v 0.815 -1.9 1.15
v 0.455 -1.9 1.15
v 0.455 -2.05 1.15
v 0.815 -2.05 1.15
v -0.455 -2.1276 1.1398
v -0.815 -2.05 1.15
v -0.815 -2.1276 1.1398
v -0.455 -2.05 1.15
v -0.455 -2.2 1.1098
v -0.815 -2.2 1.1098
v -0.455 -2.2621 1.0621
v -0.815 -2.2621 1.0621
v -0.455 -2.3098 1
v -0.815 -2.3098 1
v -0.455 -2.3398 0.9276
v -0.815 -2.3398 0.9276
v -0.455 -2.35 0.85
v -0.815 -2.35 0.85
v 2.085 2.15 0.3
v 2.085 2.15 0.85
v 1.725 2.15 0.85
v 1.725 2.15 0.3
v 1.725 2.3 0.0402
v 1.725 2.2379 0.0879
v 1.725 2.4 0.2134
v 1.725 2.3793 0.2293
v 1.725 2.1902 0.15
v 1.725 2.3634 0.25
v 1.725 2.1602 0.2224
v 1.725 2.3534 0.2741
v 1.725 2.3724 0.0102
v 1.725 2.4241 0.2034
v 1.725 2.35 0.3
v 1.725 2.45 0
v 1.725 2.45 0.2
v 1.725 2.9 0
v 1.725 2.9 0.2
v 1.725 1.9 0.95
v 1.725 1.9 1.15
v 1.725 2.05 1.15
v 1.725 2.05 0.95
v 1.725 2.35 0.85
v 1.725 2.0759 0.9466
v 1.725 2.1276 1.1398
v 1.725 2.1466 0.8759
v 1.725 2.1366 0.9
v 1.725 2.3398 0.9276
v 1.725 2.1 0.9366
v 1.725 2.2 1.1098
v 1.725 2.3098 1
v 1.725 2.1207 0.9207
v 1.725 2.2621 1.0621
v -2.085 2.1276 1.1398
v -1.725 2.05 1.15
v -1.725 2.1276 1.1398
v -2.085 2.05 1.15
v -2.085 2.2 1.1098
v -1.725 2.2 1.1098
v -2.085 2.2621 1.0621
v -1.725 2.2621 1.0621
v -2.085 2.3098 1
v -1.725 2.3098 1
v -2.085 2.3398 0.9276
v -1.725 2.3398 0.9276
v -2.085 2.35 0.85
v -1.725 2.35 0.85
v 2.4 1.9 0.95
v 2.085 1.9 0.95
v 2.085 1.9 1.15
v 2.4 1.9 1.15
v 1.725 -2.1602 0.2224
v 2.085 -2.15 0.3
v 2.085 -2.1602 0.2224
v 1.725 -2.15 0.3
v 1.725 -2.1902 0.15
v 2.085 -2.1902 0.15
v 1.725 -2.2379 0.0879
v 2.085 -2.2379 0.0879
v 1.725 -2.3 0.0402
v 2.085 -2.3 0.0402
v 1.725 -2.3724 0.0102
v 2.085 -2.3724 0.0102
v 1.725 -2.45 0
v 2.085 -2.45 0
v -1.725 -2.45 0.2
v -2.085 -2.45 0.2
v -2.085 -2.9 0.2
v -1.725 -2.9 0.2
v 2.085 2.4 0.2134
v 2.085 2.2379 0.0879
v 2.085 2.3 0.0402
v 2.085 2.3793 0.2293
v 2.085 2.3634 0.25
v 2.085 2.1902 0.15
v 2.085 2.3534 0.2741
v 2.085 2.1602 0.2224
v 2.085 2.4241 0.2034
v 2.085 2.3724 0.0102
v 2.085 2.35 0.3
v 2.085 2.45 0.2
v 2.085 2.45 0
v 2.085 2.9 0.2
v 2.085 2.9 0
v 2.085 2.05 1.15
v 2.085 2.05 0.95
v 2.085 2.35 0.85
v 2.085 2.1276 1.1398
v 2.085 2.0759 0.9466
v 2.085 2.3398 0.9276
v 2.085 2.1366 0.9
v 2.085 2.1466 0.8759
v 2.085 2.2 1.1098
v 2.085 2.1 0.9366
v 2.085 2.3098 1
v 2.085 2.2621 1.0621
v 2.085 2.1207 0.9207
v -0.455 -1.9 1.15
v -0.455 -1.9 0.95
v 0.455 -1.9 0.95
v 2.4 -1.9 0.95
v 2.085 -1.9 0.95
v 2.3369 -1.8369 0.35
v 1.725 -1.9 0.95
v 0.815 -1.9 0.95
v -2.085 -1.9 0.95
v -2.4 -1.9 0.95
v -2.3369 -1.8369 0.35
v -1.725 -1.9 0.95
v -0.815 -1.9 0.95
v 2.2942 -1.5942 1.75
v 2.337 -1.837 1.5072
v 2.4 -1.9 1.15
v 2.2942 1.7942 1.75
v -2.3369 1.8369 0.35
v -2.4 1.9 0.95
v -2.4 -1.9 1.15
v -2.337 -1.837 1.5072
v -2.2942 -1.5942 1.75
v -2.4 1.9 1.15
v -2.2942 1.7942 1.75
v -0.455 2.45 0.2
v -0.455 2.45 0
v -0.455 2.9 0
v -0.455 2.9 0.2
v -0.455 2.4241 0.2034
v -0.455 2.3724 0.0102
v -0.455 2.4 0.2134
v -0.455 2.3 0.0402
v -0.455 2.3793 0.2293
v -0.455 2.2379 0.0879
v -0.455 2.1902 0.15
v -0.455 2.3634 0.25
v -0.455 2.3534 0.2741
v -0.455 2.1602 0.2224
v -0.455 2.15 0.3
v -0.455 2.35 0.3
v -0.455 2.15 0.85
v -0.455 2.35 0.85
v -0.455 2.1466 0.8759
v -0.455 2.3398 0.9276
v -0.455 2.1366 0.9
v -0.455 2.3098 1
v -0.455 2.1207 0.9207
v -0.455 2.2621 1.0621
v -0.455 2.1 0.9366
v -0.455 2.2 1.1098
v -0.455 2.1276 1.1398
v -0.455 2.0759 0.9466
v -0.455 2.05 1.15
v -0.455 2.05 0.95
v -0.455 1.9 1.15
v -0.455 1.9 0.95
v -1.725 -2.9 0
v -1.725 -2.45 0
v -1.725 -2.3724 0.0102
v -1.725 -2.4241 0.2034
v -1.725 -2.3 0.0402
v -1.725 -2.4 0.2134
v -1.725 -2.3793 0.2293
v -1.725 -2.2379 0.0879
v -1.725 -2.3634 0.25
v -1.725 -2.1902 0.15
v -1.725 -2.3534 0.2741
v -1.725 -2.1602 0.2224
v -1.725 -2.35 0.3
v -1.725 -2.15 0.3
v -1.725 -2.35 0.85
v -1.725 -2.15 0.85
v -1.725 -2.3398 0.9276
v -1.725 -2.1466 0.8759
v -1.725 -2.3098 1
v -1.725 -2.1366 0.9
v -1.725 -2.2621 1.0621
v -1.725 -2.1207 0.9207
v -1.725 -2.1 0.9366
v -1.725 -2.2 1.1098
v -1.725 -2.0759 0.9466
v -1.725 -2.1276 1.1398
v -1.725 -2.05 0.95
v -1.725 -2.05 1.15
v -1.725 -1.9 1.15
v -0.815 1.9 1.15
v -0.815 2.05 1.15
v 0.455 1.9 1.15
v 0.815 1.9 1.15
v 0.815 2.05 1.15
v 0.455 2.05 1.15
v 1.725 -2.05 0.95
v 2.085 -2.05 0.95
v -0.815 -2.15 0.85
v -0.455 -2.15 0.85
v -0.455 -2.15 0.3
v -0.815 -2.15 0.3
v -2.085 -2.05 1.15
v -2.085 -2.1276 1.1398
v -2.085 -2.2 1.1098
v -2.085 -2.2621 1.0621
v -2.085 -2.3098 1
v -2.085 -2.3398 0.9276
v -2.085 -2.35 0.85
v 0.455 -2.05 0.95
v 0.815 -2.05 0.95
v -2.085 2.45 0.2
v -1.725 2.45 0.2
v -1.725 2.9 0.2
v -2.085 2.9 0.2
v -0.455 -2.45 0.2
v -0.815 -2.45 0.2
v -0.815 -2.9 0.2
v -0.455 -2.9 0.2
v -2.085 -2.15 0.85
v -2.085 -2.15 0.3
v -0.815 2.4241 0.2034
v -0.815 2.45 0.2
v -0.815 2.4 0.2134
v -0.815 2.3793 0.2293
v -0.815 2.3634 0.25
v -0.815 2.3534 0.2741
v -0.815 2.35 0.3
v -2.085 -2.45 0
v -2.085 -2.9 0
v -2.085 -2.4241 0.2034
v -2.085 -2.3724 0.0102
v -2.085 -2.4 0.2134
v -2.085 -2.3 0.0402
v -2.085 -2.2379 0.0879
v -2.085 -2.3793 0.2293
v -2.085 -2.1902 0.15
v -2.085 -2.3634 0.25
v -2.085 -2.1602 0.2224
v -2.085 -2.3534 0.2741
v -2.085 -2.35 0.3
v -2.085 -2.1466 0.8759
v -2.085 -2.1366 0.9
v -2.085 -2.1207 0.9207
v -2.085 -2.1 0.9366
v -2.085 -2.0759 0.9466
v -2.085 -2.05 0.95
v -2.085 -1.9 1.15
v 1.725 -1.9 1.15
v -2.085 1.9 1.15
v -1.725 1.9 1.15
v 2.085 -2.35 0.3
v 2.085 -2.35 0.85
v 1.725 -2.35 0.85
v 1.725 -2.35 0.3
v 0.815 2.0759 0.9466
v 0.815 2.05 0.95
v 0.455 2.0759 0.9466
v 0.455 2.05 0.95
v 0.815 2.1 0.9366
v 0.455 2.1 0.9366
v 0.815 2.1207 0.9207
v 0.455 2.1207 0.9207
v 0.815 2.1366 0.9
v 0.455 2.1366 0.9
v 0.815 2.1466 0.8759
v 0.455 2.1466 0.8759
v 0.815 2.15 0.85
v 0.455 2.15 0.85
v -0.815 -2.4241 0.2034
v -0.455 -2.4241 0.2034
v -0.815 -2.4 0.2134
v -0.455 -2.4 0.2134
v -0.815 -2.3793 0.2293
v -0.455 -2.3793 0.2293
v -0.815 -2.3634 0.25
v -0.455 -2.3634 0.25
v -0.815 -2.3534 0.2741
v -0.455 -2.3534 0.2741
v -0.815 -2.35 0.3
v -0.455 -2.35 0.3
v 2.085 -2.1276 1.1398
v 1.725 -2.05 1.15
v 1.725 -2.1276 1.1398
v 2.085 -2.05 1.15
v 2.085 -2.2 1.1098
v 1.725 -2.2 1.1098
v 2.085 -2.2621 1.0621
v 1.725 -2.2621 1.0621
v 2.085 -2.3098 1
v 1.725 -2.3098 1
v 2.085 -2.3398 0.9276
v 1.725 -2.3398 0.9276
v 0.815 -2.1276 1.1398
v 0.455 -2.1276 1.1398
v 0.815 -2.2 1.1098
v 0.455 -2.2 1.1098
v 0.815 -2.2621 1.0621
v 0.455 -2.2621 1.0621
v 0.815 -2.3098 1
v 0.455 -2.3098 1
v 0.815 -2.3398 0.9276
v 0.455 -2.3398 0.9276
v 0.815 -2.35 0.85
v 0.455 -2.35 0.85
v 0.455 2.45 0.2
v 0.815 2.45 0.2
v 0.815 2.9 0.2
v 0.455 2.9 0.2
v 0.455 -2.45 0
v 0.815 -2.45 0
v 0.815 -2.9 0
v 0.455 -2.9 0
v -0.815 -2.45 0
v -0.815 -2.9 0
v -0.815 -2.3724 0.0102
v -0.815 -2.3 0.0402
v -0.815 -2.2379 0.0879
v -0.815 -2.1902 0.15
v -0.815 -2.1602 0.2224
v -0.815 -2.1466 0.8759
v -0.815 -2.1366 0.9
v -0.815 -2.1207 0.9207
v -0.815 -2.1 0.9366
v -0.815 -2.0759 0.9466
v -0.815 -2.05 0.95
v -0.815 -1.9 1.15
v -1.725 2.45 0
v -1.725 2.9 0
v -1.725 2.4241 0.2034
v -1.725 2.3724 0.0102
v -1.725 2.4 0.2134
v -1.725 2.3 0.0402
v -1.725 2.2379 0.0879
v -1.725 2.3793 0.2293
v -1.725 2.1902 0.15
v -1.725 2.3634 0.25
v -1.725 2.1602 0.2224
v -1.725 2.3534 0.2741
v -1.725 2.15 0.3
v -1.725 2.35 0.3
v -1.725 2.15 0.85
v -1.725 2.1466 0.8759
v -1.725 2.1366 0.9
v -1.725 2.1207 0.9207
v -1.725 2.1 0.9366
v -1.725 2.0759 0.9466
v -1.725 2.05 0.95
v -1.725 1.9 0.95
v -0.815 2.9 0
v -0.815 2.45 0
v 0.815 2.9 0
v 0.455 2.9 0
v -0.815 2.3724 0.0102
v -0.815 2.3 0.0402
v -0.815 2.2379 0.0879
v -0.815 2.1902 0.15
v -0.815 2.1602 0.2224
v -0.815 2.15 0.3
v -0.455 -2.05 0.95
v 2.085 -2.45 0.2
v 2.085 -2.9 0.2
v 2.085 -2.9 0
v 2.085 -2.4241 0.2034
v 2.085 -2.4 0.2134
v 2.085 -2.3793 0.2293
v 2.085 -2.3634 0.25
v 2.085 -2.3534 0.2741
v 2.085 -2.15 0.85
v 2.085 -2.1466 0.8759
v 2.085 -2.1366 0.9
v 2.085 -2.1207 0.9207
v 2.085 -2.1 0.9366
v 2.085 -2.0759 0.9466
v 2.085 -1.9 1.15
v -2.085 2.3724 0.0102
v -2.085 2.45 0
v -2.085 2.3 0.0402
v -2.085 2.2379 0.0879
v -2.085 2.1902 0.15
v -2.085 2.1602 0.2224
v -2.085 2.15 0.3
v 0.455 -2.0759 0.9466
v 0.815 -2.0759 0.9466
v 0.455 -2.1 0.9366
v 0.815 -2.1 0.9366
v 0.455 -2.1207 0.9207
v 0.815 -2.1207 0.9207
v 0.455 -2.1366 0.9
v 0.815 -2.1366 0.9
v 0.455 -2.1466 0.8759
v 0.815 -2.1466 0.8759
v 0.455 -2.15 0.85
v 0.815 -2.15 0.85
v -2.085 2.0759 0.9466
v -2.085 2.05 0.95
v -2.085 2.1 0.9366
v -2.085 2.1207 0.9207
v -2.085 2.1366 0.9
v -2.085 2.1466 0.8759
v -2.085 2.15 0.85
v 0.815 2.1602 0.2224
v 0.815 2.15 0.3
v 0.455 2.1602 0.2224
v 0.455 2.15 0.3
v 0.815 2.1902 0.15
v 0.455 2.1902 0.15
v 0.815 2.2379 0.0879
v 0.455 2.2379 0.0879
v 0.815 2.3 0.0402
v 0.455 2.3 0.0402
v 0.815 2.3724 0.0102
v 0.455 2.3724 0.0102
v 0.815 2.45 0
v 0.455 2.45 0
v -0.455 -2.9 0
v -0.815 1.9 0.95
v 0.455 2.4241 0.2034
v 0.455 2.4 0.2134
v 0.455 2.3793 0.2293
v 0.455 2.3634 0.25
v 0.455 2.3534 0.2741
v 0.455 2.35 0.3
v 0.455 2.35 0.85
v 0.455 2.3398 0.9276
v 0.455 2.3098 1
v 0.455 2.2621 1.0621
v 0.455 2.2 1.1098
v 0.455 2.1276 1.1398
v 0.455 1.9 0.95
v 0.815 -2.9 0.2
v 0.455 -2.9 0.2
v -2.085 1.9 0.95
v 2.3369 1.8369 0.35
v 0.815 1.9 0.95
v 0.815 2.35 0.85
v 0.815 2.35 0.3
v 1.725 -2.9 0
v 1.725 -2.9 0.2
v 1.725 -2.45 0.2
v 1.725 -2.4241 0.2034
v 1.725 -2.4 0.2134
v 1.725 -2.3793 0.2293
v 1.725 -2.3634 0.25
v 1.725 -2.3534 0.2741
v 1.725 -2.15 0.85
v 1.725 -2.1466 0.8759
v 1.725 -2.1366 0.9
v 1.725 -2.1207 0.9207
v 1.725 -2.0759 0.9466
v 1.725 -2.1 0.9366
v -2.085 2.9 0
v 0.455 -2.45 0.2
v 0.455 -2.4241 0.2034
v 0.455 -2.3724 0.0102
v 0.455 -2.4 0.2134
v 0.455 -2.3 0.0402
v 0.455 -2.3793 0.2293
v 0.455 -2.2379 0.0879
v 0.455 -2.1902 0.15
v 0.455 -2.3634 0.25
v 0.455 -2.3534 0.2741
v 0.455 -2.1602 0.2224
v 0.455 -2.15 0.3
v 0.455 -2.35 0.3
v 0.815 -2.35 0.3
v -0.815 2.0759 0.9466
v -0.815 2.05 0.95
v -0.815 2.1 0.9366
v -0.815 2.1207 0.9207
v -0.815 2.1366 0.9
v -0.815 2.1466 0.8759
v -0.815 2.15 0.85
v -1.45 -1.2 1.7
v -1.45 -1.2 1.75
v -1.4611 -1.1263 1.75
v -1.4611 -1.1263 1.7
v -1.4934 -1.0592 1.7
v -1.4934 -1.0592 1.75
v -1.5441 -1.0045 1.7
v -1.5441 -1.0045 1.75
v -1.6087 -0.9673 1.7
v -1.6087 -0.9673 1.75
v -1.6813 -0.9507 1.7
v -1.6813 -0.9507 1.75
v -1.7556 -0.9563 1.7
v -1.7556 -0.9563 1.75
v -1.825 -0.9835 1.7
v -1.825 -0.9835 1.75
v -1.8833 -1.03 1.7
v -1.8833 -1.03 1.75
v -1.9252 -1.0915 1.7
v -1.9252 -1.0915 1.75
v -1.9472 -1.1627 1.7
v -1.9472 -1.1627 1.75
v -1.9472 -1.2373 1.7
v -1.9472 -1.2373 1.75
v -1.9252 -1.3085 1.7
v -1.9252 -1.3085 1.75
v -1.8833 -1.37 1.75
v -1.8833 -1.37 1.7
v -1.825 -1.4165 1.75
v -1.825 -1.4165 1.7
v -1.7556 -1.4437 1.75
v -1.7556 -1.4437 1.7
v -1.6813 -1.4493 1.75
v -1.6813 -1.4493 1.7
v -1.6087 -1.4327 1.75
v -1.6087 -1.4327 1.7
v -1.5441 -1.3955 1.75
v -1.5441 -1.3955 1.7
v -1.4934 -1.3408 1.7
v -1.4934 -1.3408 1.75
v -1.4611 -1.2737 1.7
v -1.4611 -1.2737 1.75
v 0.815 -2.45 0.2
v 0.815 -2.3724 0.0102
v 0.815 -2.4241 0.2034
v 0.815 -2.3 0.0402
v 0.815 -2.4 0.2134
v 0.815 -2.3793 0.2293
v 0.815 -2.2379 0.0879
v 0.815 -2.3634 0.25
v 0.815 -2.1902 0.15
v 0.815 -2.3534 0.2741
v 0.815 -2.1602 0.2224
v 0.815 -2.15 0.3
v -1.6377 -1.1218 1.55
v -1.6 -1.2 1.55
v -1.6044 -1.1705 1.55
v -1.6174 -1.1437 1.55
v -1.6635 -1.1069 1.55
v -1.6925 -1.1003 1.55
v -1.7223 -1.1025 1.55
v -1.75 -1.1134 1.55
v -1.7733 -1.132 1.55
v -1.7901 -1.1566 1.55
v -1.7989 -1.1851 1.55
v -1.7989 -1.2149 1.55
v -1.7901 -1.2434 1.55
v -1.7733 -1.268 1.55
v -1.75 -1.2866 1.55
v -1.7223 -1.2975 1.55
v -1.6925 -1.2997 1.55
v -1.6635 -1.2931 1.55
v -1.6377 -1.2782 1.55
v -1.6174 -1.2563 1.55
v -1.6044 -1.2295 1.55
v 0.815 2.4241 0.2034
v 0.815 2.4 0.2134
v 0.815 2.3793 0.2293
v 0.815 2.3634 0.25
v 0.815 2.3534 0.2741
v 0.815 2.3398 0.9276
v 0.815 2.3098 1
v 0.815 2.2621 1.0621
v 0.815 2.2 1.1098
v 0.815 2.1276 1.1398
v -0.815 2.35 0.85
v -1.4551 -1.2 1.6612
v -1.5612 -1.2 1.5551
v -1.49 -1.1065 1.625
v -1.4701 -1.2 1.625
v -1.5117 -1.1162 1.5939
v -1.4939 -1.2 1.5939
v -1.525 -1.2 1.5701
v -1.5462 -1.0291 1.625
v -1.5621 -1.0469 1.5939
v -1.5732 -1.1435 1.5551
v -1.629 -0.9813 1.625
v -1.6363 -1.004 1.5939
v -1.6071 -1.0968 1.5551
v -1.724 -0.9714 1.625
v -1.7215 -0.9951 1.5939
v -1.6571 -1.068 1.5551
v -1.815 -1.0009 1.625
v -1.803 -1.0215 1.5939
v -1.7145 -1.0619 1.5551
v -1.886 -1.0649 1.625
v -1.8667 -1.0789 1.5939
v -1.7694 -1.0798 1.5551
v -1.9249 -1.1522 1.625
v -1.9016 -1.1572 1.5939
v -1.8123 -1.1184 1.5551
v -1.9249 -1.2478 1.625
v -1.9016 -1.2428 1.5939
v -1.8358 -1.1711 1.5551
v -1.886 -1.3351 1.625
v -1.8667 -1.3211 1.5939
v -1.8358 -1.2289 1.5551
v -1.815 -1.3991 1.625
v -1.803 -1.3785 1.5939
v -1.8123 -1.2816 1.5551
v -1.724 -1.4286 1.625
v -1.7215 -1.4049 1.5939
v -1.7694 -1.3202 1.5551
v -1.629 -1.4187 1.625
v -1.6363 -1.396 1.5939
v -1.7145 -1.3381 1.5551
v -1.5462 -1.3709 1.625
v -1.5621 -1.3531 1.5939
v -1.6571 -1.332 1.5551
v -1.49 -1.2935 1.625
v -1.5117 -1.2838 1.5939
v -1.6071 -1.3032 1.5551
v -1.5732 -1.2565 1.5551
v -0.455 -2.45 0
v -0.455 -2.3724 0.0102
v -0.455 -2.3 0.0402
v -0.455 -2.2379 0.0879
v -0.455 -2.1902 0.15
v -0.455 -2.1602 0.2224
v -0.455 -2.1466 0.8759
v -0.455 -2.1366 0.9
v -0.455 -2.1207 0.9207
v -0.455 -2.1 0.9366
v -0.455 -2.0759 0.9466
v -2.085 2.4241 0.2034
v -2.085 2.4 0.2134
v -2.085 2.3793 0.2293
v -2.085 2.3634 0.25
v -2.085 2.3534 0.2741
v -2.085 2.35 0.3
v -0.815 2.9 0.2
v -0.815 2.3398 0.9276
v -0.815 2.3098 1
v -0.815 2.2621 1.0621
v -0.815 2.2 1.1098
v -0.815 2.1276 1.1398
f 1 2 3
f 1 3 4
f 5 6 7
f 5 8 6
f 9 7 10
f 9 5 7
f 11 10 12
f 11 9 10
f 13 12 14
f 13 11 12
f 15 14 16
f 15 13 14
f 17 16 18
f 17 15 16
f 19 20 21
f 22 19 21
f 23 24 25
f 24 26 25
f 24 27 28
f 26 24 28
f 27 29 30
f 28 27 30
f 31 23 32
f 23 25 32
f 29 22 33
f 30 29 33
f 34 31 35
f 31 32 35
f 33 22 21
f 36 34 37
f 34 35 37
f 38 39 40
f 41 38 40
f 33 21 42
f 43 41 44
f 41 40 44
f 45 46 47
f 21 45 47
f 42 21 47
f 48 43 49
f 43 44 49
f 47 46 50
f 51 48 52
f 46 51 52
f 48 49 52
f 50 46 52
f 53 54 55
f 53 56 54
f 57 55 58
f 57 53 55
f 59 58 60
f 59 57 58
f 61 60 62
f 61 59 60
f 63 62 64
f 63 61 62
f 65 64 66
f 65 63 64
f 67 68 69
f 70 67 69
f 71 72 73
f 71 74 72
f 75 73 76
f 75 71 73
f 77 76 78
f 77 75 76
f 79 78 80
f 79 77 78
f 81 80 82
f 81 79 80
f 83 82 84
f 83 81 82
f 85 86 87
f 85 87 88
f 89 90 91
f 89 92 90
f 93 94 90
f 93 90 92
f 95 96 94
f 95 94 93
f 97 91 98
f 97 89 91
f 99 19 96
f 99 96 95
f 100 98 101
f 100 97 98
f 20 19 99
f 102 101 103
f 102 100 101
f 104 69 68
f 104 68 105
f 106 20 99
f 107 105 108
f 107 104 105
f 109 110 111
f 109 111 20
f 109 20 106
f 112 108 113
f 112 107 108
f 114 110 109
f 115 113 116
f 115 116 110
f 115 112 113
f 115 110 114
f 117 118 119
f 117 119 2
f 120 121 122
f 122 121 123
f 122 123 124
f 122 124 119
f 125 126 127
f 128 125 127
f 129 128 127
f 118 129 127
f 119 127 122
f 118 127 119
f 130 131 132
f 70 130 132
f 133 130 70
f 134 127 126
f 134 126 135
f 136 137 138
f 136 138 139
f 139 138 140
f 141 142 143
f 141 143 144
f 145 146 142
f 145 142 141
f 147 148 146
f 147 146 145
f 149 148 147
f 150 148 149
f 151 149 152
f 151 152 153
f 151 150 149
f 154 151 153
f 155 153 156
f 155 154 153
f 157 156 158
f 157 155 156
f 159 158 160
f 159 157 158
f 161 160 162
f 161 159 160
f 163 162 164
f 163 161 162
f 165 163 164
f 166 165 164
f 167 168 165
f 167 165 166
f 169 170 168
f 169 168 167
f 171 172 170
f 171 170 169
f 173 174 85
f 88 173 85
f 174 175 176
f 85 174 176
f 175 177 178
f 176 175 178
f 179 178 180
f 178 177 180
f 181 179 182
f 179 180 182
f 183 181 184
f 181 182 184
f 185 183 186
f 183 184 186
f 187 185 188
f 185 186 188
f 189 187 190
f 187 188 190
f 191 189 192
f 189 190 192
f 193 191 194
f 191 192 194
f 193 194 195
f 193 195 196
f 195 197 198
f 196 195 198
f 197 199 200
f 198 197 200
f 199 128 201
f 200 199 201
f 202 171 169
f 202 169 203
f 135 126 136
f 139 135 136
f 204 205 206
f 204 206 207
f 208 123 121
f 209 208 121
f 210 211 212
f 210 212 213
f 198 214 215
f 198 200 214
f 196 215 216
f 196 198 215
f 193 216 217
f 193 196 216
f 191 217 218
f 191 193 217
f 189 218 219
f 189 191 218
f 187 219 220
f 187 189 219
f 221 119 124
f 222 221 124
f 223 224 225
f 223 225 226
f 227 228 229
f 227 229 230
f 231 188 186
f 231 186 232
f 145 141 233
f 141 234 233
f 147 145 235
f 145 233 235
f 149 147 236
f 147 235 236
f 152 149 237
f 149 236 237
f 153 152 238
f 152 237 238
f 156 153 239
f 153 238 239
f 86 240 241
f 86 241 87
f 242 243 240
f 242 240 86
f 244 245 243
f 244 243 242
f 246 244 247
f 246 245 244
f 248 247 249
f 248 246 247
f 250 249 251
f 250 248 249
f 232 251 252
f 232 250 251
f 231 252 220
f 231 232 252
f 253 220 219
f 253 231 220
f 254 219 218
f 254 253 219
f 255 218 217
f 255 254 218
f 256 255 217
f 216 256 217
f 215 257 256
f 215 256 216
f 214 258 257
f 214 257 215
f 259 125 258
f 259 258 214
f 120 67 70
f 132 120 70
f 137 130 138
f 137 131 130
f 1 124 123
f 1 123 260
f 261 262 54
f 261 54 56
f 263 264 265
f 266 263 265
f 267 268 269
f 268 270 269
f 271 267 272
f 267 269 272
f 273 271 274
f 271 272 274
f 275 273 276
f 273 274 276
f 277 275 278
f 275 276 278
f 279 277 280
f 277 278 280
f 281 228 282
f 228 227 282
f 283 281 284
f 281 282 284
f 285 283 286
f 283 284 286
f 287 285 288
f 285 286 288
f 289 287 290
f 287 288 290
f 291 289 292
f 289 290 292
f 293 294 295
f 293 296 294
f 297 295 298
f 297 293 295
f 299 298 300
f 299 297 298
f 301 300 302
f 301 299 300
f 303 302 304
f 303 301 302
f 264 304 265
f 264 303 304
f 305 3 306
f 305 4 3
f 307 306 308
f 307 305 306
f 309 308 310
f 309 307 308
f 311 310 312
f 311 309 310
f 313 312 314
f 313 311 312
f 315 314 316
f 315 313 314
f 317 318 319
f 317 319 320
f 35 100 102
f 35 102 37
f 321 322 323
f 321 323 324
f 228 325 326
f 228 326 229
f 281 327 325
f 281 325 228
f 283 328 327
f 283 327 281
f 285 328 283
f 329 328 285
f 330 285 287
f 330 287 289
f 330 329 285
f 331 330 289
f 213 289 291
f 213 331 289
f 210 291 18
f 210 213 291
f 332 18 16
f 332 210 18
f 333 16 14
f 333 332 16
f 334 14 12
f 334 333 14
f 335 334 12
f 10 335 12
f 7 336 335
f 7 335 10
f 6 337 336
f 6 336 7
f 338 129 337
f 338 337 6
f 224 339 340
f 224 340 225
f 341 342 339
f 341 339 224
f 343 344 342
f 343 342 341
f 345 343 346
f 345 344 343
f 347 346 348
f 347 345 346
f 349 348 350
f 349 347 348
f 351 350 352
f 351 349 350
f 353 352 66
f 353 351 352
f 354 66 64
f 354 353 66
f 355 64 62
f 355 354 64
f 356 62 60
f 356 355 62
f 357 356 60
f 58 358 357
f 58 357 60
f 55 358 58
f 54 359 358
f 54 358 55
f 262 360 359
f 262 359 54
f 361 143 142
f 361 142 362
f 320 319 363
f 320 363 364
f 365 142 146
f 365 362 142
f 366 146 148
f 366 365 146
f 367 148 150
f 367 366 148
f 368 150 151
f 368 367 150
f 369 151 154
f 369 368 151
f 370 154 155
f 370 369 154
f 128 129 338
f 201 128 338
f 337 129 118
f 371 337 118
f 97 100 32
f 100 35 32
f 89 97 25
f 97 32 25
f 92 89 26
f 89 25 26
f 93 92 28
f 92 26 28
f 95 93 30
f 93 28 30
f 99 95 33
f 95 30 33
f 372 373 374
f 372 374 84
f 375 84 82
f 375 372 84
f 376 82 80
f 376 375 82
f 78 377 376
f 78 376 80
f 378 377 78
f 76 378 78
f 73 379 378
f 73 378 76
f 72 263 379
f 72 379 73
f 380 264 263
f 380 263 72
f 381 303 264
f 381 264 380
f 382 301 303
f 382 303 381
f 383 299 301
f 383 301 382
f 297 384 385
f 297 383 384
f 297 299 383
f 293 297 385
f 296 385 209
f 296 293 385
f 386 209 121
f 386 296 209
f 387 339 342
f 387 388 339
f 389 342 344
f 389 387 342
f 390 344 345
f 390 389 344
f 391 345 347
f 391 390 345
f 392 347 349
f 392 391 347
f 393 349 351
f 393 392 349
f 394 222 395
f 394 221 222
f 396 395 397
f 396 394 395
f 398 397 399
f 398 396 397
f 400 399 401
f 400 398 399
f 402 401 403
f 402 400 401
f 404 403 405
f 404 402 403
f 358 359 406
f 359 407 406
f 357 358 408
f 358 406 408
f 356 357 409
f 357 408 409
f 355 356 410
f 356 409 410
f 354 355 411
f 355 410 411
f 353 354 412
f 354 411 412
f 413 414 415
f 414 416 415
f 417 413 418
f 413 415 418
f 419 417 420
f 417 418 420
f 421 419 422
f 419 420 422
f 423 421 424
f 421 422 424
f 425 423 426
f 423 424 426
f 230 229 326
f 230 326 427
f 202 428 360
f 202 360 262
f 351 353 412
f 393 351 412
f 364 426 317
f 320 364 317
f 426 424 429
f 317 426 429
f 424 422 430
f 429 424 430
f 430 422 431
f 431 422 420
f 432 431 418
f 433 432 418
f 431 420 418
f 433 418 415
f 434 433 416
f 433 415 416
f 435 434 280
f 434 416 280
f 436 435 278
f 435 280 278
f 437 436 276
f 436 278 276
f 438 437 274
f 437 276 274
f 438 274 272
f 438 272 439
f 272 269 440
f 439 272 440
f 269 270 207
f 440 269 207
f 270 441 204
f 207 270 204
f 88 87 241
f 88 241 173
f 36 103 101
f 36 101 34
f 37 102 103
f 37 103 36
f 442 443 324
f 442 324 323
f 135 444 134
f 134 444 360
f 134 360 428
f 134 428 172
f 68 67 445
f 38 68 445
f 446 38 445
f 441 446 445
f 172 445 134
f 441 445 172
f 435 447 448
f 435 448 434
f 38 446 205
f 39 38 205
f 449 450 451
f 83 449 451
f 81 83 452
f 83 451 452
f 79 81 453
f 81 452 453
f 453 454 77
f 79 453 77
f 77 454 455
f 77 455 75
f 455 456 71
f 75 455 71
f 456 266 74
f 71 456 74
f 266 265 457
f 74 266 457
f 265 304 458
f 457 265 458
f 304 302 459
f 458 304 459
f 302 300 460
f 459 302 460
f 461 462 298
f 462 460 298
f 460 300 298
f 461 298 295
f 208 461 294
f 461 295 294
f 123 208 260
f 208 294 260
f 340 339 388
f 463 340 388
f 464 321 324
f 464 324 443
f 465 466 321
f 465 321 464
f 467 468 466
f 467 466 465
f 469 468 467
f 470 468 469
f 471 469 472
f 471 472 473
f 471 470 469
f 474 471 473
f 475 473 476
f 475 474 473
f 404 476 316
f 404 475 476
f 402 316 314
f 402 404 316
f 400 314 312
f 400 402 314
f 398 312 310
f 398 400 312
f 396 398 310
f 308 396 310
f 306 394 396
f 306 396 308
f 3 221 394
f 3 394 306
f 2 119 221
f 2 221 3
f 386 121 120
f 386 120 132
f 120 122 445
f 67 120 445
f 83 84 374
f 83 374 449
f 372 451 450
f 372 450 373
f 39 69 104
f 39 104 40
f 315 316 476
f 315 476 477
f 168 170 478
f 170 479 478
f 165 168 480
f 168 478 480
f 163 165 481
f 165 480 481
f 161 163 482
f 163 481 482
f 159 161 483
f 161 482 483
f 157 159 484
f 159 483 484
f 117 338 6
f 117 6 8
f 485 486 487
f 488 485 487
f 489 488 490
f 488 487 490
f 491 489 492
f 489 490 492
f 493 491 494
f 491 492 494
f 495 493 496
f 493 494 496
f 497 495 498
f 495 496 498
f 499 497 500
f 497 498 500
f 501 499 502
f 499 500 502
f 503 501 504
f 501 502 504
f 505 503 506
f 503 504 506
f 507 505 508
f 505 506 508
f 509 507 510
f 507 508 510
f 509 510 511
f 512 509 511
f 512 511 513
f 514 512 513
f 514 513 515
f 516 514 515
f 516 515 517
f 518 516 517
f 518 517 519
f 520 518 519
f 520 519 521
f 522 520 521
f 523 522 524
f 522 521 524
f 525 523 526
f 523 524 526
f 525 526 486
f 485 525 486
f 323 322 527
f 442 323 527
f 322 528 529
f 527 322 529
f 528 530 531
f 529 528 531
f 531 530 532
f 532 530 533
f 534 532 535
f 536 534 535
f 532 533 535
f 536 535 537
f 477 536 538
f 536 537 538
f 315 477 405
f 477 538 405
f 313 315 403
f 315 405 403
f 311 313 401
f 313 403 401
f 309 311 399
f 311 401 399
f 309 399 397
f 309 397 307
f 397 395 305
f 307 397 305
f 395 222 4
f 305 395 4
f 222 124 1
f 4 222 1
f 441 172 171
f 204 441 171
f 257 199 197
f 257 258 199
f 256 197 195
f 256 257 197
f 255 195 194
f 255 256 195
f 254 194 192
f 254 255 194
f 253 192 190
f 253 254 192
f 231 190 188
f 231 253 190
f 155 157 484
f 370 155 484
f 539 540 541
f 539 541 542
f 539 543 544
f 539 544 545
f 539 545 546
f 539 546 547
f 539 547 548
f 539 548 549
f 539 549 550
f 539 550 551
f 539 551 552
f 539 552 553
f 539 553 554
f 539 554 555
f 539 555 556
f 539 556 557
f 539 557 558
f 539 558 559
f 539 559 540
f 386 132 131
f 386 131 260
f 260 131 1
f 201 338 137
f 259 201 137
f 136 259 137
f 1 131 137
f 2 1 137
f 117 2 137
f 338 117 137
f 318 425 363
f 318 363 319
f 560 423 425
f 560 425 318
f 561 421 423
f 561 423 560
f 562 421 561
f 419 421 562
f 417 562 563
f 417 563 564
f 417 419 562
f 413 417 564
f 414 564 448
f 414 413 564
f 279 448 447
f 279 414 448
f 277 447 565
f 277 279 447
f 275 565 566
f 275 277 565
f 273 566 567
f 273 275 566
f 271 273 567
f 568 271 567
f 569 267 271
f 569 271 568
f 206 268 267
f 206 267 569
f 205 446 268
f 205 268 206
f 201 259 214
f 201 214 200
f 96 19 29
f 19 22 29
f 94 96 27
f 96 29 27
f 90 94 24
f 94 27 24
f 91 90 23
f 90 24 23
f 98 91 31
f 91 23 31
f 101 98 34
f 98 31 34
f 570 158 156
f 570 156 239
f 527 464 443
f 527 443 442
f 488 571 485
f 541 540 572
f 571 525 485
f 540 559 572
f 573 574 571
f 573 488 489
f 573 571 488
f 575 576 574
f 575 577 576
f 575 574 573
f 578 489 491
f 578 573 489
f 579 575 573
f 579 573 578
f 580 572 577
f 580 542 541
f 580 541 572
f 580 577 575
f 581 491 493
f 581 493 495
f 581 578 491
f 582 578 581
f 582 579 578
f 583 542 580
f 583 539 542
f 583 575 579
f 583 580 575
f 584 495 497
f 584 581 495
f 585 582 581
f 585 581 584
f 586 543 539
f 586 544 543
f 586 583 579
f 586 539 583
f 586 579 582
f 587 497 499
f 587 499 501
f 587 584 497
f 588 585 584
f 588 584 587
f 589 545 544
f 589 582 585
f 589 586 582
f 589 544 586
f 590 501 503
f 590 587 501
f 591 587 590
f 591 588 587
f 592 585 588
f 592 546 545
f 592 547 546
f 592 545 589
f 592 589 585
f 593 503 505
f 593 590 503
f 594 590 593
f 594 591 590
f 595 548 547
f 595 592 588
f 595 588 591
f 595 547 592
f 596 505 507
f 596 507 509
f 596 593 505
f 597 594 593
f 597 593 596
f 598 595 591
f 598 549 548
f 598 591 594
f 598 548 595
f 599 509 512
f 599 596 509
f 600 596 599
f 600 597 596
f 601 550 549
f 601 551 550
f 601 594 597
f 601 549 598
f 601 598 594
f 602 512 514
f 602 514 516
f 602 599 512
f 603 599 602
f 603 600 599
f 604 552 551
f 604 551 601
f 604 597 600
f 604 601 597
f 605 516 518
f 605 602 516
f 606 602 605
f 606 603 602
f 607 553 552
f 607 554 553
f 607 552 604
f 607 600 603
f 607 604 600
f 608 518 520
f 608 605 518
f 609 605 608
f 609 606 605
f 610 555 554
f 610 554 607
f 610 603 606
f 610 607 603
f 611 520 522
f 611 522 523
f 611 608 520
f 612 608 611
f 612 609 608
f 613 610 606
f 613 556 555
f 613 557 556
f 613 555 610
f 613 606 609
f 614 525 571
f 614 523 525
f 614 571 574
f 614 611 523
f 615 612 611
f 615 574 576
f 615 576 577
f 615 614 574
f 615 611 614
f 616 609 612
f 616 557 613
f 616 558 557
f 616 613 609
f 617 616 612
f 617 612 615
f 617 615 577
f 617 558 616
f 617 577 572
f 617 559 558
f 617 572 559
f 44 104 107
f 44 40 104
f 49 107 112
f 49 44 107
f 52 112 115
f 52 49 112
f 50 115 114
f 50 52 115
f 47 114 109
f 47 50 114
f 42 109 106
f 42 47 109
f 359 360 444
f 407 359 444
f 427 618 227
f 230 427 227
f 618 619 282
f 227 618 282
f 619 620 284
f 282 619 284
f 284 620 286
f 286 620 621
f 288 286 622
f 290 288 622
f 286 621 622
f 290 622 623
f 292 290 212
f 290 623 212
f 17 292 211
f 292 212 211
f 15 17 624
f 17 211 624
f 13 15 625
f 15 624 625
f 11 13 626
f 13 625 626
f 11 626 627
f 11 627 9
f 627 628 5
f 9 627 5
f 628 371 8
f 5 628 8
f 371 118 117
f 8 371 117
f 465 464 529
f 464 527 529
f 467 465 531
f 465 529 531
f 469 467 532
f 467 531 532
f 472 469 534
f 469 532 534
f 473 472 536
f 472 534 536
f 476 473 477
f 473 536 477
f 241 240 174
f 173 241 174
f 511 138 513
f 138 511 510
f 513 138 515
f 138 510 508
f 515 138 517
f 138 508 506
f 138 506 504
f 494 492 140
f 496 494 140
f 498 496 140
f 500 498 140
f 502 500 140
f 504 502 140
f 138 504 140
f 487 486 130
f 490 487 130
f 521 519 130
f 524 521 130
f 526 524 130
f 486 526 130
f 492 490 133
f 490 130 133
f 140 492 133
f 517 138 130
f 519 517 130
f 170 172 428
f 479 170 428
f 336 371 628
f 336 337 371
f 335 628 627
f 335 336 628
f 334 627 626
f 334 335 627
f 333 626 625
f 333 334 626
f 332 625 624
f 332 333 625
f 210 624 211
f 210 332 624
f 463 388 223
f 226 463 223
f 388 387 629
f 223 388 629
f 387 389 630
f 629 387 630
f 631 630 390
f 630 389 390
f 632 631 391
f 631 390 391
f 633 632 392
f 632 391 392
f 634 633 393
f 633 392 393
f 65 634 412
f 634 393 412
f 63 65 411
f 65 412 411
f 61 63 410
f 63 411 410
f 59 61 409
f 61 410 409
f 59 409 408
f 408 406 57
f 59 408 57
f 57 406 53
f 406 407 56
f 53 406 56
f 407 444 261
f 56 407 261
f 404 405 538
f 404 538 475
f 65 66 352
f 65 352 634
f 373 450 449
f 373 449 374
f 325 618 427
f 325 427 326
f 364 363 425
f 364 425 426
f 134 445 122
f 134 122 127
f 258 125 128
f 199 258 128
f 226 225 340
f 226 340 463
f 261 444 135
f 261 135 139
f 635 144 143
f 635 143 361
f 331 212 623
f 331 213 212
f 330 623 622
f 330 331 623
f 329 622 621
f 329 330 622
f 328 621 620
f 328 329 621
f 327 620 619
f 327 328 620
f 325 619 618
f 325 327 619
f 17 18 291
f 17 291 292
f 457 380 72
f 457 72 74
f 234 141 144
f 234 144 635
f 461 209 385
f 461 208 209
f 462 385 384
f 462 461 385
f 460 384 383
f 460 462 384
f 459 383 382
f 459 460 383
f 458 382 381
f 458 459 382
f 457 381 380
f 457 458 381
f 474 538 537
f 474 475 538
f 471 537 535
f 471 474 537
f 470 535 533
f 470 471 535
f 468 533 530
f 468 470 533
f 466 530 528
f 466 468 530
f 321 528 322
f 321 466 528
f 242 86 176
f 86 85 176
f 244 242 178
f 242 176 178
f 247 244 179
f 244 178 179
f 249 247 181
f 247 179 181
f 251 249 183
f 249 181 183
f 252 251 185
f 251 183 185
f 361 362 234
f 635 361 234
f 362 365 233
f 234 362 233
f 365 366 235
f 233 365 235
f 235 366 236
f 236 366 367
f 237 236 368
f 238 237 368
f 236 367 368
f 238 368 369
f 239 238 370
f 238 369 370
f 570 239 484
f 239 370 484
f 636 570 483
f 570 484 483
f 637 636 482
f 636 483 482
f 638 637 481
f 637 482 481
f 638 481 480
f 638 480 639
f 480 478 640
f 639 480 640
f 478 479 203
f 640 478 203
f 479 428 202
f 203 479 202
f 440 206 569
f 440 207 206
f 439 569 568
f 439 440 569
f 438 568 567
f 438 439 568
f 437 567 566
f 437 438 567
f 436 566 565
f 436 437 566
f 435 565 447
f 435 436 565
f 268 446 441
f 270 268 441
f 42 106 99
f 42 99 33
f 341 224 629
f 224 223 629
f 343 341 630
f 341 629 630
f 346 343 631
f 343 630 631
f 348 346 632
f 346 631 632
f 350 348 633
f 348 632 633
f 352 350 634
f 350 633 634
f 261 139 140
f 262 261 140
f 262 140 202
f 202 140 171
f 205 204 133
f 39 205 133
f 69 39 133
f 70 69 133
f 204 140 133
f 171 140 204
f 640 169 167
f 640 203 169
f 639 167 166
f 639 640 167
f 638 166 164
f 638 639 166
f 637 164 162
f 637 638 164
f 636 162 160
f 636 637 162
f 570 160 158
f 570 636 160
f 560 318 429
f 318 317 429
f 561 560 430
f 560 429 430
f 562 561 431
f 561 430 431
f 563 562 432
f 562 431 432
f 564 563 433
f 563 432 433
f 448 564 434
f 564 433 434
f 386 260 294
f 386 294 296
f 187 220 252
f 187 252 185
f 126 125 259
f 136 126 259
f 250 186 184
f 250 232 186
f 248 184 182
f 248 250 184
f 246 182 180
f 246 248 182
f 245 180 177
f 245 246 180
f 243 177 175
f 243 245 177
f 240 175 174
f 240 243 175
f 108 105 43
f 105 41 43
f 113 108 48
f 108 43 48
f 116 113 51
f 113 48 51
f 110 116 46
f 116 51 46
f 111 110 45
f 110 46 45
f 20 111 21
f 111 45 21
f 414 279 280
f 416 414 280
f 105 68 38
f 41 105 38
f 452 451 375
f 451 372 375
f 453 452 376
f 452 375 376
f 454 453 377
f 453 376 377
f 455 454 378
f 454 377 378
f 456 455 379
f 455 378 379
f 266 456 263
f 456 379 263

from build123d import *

# Parameters (mm, degrees)
SZKIC1_W                   = 2.4
SZKIC1_H                   = 1.9
WYCI_GNI_CIE1_DEPTH        = 1.75
SZKIC2_W                   = 2.4
SZKIC2_H                   = 1.75
WYCI_GNI_CIE2_DEPTH        = 1.9
SZKIC3_W                   = 1.75
SZKIC3_H                   = 3.8
WYCI_GNI_CIE3_DEPTH        = 2.4
SFAZOWANIE1_SIZE           = 0.6
SFAZOWANIE1_SIZE2          = 0.105796188
SFAZOWANIE3_SIZE           = 0.2
SFAZOWANIE3_SIZE2          = 0.24656061
SFAZOWANIE4_SIZE           = 0.6
SFAZOWANIE4_SIZE2          = 0.105796188
SZKIC4_W                   = 0.36
SZKIC4_H                   = 0.2
WYCI_GNI_CIE4_DEPTH        = 0.45
SZKIC6_W                   = 0.36
SZKIC6_H                   = 0.2
WYCI_GNI_CIE5_DEPTH        = 0.95
SZKIC10_W                  = 0.36
SZKIC10_H                  = 0.2
WYCI_GNI_CIE6_DEPTH        = 0.45
SZKIC11_W                  = 0.36
SZKIC11_H                  = 0.2
WYCI_GNI_CIE7_DEPTH        = 0.95
SZKIC12_W                  = 4.8
SZKIC12_H                  = 3.8
WYTNIJ_WYCI_GNI_CIE3_DEPTH = 0.35
SFAZOWANIE6_SIZE           = 0.6
SFAZOWANIE6_SIZE_2         = 0.063062541
SFAZOWANIE7_SIZE           = 0.6
SFAZOWANIE7_SIZE2          = 0.063062541
SFAZOWANIE8_SIZE           = 0.6
SFAZOWANIE8_SIZE_2         = 0.063062541
SFAZOWANIE9_SIZE           = 0.6
SFAZOWANIE9_SIZE2          = 0.063062541
SFAZOWANIE10_SIZE          = 0.6
SFAZOWANIE10_SIZE2         = 0.105796188
SFAZOWANIE11_SIZE          = 0.6
SFAZOWANIE11_SIZE2         = 0.105796188
SZKIC13_W                  = 0.36
SZKIC13_H                  = 0.2
WYCI_GNI_CIE8_DEPTH        = 0.55
SZKIC14_W                  = 0.36
SZKIC14_H                  = 0.2
WYCI_GNI_CIE9_DEPTH        = 0.55
ZAOKR_GLENIE1_R            = 0.3
ZAOKR_GLENIE2_R            = 0.3
ZAOKR_GLENIE3_R            = 0.3
ZAOKR_GLENIE4_R            = 0.3
ZAOKR_GLENIE5_R            = 0.1
ZAOKR_GLENIE6_R            = 0.3
ZAOKR_GLENIE7_R            = 0.3
ZAOKR_GLENIE8_R            = 0.3
ZAOKR_GLENIE9_R            = 0.3
ZAOKR_GLENIE10_R           = 0.3
ZAOKR_GLENIE11_R           = 0.3
ZAOKR_GLENIE12_R           = 0.3
ZAOKR_GLENIE13_R           = 0.3
ZAOKR_GLENIE14_R           = 0.3
ZAOKR_GLENIE15_R           = 0.3
ZAOKR_GLENIE16_R           = 0.3
ZAOKR_GLENIE17_R           = 0.3
ZAOKR_GLENIE18_R           = 0.1
ZAOKR_GLENIE19_R           = 0.1
ZAOKR_GLENIE20_R           = 0.1
ZAOKR_GLENIE21_R           = 0.1
ZAOKR_GLENIE22_R           = 0.1
ZAOKR_GLENIE23_R           = 0.1
ZAOKR_GLENIE24_R           = 0.1
ZAOKR_GLENIE25_R           = 0.1
ZAOKR_GLENIE26_R           = 0.1
ZAOKR_GLENIE27_R           = 0.1
ZAOKR_GLENIE28_R           = 0.1
ZAOKR_GLENIE29_R           = 0.1
ZAOKR_GLENIE30_R           = 0.1
ZAOKR_GLENIE31_R           = 0.1
ZAOKR_GLENIE32_R           = 0.1
SZKIC15_R                  = 0.25
WYTNIJ_WYCI_GNI_CIE4_DEPTH = 0.2
ZAOKR_GLENIE33_R           = 0.15


with BuildPart() as part:
    # Szkic1 → Wyciągnięcie1 (new body)
    with BuildSketch(Plane.XY):
        with Locations((1.2, 0.95)):
            Rectangle(SZKIC1_W, SZKIC1_H)
    extrude(amount=WYCI_GNI_CIE1_DEPTH)

    # Szkic2 → Wyciągnięcie2 (add)
    with BuildSketch(Plane.XZ):
        with Locations((1.2, 0.875)):
            Rectangle(SZKIC2_W, SZKIC2_H)
    extrude(amount=WYCI_GNI_CIE2_DEPTH)

    # Szkic3 → Wyciągnięcie3 (add)
    with BuildSketch(Plane.ZY):
        with Locations((0.875, 0)):
            Rectangle(SZKIC3_W, SZKIC3_H)
    extrude(amount=WYCI_GNI_CIE3_DEPTH)

    # Sfazowanie1
    sfazowanie1_edges = [part.edges().sort_by_distance(p)[0] for p in [
        (0, -1.9, 1.75),
    ]]
    sfazowanie1_side = [part.faces().sort_by_distance(p)[0] for p in [
        (0, -1.9, 0.875),
    ]]
    chamfer(sfazowanie1_edges, length=SFAZOWANIE1_SIZE, length2=SFAZOWANIE1_SIZE2, reference=sfazowanie1_side[0])

    # Sfazowanie3
    sfazowanie3_edges = [part.edges().sort_by_distance(p)[0] for p in [
        (0, -1.794203812, 1.75),
    ]]
    sfazowanie3_side = [part.faces().sort_by_distance(p)[0] for p in [
        (0, 0.052898094, 1.75),
    ]]
    chamfer(sfazowanie3_edges, length=SFAZOWANIE3_SIZE, length2=SFAZOWANIE3_SIZE2, reference=sfazowanie3_side[0])

    # Sfazowanie4
    sfazowanie4_edges = [part.edges().sort_by_distance(p)[0] for p in [
        (0, 1.9, 1.75),
    ]]
    sfazowanie4_side = [part.faces().sort_by_distance(p)[0] for p in [
        (0, 1.9, 0.875),
    ]]
    chamfer(sfazowanie4_edges, length=SFAZOWANIE4_SIZE, length2=SFAZOWANIE4_SIZE2, reference=sfazowanie4_side[0])

    # Szkic4 → Wyciągnięcie4 (add)
    with BuildSketch(Plane.XZ.offset(1.9)):
        with Locations((-1.905, 1.05)):
            Rectangle(SZKIC4_W, SZKIC4_H)
        with Locations((-0.635, 1.05)):
            Rectangle(SZKIC4_W, SZKIC4_H)
        with Locations((0.635, 1.05)):
            Rectangle(SZKIC4_W, SZKIC4_H)
        with Locations((1.905, 1.05)):
            Rectangle(SZKIC4_W, SZKIC4_H)
    extrude(amount=WYCI_GNI_CIE4_DEPTH)

    # Szkic6 → Wyciągnięcie5 (add)
    with BuildSketch(Plane(origin=(0, 0, 0.95), x_dir=(-1, 0, 0), z_dir=(0, 0, -1))):
        with Locations((-1.905, -2.25)):
            Rectangle(SZKIC6_W, SZKIC6_H)
        with Locations((-0.635, -2.25)):
            Rectangle(SZKIC6_W, SZKIC6_H)
        with Locations((0.635, -2.25)):
            Rectangle(SZKIC6_W, SZKIC6_H)
        with Locations((1.905, -2.25)):
            Rectangle(SZKIC6_W, SZKIC6_H)
    extrude(amount=WYCI_GNI_CIE5_DEPTH)

    # Szkic10 → Wyciągnięcie6 (add)
    with BuildSketch(Plane(origin=(0, 1.9, 0), x_dir=(-1, 0, 0), z_dir=(0, 1, 0))):
        with Locations((1.905, 1.05)):
            Rectangle(SZKIC10_W, SZKIC10_H)
        with Locations((0.635, 1.05)):
            Rectangle(SZKIC10_W, SZKIC10_H)
        with Locations((-0.635, 1.05)):
            Rectangle(SZKIC10_W, SZKIC10_H)
        with Locations((-1.905, 1.05)):
            Rectangle(SZKIC10_W, SZKIC10_H)
    extrude(amount=WYCI_GNI_CIE6_DEPTH)

    # Szkic11 → Wyciągnięcie7 (add)
    with BuildSketch(Plane(origin=(0, 0, 0.95), x_dir=(-1, 0, 0), z_dir=(0, 0, -1))):
        with Locations((-1.905, 2.25)):
            Rectangle(SZKIC11_W, SZKIC11_H)
        with Locations((-0.635, 2.25)):
            Rectangle(SZKIC11_W, SZKIC11_H)
        with Locations((0.635, 2.25)):
            Rectangle(SZKIC11_W, SZKIC11_H)
        with Locations((1.905, 2.25)):
            Rectangle(SZKIC11_W, SZKIC11_H)
    extrude(amount=WYCI_GNI_CIE7_DEPTH)

    # Szkic12 → Wytnij-wyciągnięcie3 (cut)
    with BuildSketch(Plane(origin=(0, 0, 0), x_dir=(-1, 0, 0), z_dir=(0, 0, -1))):
        Rectangle(SZKIC12_W, SZKIC12_H)
    extrude(amount=-WYTNIJ_WYCI_GNI_CIE3_DEPTH, mode=Mode.SUBTRACT)

    # Sfazowanie6
    # the kernel refuses this chamfer: 0.6, 0.063062541 mm, written as the material it takes off along each edge
    with BuildSketch(Plane(origin=(-3.959683923, -1.9, 0.35), x_dir=(0, -0.00402114024619829, 0.999991915182878), z_dir=(1, 0, 0))) as sfazowanie6_piece_1:
        Polygon((SFAZOWANIE6_SIZE * 0.999991915183, -SFAZOWANIE6_SIZE * 0.0040211402462), (-SFAZOWANIE6_SIZE_2 * 0.00402114025636, -SFAZOWANIE6_SIZE_2 * 0.999991917711), (0, 0), align=None)
    extrude(amount=7.919367847, mode=Mode.SUBTRACT)

    # Sfazowanie7
    sfazowanie7_edges = [part.edges().sort_by_distance(p)[0] for p in [
        (2.4, 0.031531271, 0.35),
    ]]
    sfazowanie7_side = [part.faces().sort_by_distance(p)[0] for p in [
        (2.4, 0.014931296, 1.042843103),
    ]]
    chamfer(sfazowanie7_edges, length=SFAZOWANIE7_SIZE, length2=SFAZOWANIE7_SIZE2, reference=sfazowanie7_side[0])

    # Sfazowanie8
    # the kernel refuses this chamfer: 0.6, 0.063062541 mm, written as the material it takes off along each edge
    with BuildSketch(Plane(origin=(3.896621382, 1.9, 0.35), x_dir=(0, 0.00402114024619829, 0.999991915182878), z_dir=(-1, 0, 0))) as sfazowanie8_piece_1:
        Polygon((SFAZOWANIE8_SIZE * 0.999991915183, -SFAZOWANIE8_SIZE * 0.0040211402462), (-SFAZOWANIE8_SIZE_2 * 0.00402114025636, -SFAZOWANIE8_SIZE_2 * 0.999991917711), (0, 0), align=None)
    extrude(amount=7.856305306, mode=Mode.SUBTRACT)

    # Sfazowanie9
    sfazowanie9_edges = [part.edges().sort_by_distance(p)[0] for p in [
        (-2.4, 0, 0.35),
    ]]
    sfazowanie9_side = [part.faces().sort_by_distance(p)[0] for p in [
        (-2.4, 0.008142166, 1.044638108),
    ]]
    chamfer(sfazowanie9_edges, length=SFAZOWANIE9_SIZE, length2=SFAZOWANIE9_SIZE2, reference=sfazowanie9_side[0])

    # Sfazowanie10
    sfazowanie10_edges = [part.edges().sort_by_distance(p)[0] for p in [
        (-2.4, 0.1, 1.75),
    ]]
    sfazowanie10_side = [part.faces().sort_by_distance(p)[0] for p in [
        (-2.4, 0.014325964, 1.343075486),
    ]]
    chamfer(sfazowanie10_edges, length=SFAZOWANIE10_SIZE, length2=SFAZOWANIE10_SIZE2, reference=sfazowanie10_side[0])

    # Sfazowanie11
    sfazowanie11_edges = [part.edges().sort_by_distance(p)[0] for p in [
        (2.4, 0.1, 1.75),
    ]]
    sfazowanie11_side = [part.faces().sort_by_distance(p)[0] for p in [
        (2.4, 0.014325964, 1.343075486),
    ]]
    chamfer(sfazowanie11_edges, length=SFAZOWANIE11_SIZE, length2=SFAZOWANIE11_SIZE2, reference=sfazowanie11_side[0])

    # Szkic13 → Wyciągnięcie8 (add)
    with BuildSketch(Plane(origin=(0, 2.35, 0), x_dir=(-1, 0, 0), z_dir=(0, 1, 0))):
        with Locations((1.905, 0.1)):
            Rectangle(SZKIC13_W, SZKIC13_H)
        with Locations((0.635, 0.1)):
            Rectangle(SZKIC13_W, SZKIC13_H)
        with Locations((-0.635, 0.1)):
            Rectangle(SZKIC13_W, SZKIC13_H)
        with Locations((-1.905, 0.1)):
            Rectangle(SZKIC13_W, SZKIC13_H)
    extrude(amount=WYCI_GNI_CIE8_DEPTH)

    # Szkic14 → Wyciągnięcie9 (add)
    with BuildSketch(Plane.XZ.offset(2.35)):
        with Locations((-1.905, 0.1)):
            Rectangle(SZKIC14_W, SZKIC14_H)
        with Locations((-0.635, 0.1)):
            Rectangle(SZKIC14_W, SZKIC14_H)
        with Locations((0.635, 0.1)):
            Rectangle(SZKIC14_W, SZKIC14_H)
        with Locations((1.905, 0.1)):
            Rectangle(SZKIC14_W, SZKIC14_H)
    extrude(amount=WYCI_GNI_CIE9_DEPTH)

    # Zaokrąglenie1
    zaokr_glenie1_edges = [part.edges().sort_by_distance(p)[0] for p in [
        (-1.905, -2.35, 1.15),
    ]]
    fillet(zaokr_glenie1_edges, radius=ZAOKR_GLENIE1_R)

    # Zaokrąglenie2
    zaokr_glenie2_edges = [part.edges().sort_by_distance(p)[0] for p in [
        (-0.635, -2.35, 1.15),
    ]]
    fillet(zaokr_glenie2_edges, radius=ZAOKR_GLENIE2_R)

    # Zaokrąglenie3
    zaokr_glenie3_edges = [part.edges().sort_by_distance(p)[0] for p in [
        (0.635, -2.35, 1.15),
    ]]
    fillet(zaokr_glenie3_edges, radius=ZAOKR_GLENIE3_R)

    # Zaokrąglenie4
    zaokr_glenie4_edges = [part.edges().sort_by_distance(p)[0] for p in [
        (1.905, -2.35, 1.15),
    ]]
    fillet(zaokr_glenie4_edges, radius=ZAOKR_GLENIE4_R)

    # Zaokrąglenie5
    zaokr_glenie5_edges = [part.edges().sort_by_distance(p)[0] for p in [
        (-1.905, -2.15, 0.95),
    ]]
    fillet(zaokr_glenie5_edges, radius=ZAOKR_GLENIE5_R)

    # Zaokrąglenie6
    zaokr_glenie6_edges = [part.edges().sort_by_distance(p)[0] for p in [
        (1.905, -2.15, 0),
    ]]
    fillet(zaokr_glenie6_edges, radius=ZAOKR_GLENIE6_R)

    # Zaokrąglenie7
    zaokr_glenie7_edges = [part.edges().sort_by_distance(p)[0] for p in [
        (0.635, -2.15, 0),
    ]]
    fillet(zaokr_glenie7_edges, radius=ZAOKR_GLENIE7_R)

    # Zaokrąglenie8
    zaokr_glenie8_edges = [part.edges().sort_by_distance(p)[0] for p in [
        (-0.635, -2.15, 0),
    ]]
    fillet(zaokr_glenie8_edges, radius=ZAOKR_GLENIE8_R)

    # Zaokrąglenie9
    zaokr_glenie9_edges = [part.edges().sort_by_distance(p)[0] for p in [
        (-1.905, -2.15, 0),
    ]]
    fillet(zaokr_glenie9_edges, radius=ZAOKR_GLENIE9_R)

    # Zaokrąglenie10
    zaokr_glenie10_edges = [part.edges().sort_by_distance(p)[0] for p in [
        (1.905, 2.35, 1.15),
    ]]
    fillet(zaokr_glenie10_edges, radius=ZAOKR_GLENIE10_R)

    # Zaokrąglenie11
    zaokr_glenie11_edges = [part.edges().sort_by_distance(p)[0] for p in [
        (0.635, 2.35, 1.15),
    ]]
    fillet(zaokr_glenie11_edges, radius=ZAOKR_GLENIE11_R)

    # Zaokrąglenie12
    zaokr_glenie12_edges = [part.edges().sort_by_distance(p)[0] for p in [
        (-0.635, 2.35, 1.15),
    ]]
    fillet(zaokr_glenie12_edges, radius=ZAOKR_GLENIE12_R)

    # Zaokrąglenie13
    zaokr_glenie13_edges = [part.edges().sort_by_distance(p)[0] for p in [
        (-1.905, 2.35, 1.15),
    ]]
    fillet(zaokr_glenie13_edges, radius=ZAOKR_GLENIE13_R)

    # Zaokrąglenie14
    zaokr_glenie14_edges = [part.edges().sort_by_distance(p)[0] for p in [
        (-1.905, 2.15, 0),
    ]]
    fillet(zaokr_glenie14_edges, radius=ZAOKR_GLENIE14_R)

    # Zaokrąglenie15
    zaokr_glenie15_edges = [part.edges().sort_by_distance(p)[0] for p in [
        (-0.635, 2.15, 0),
    ]]
    fillet(zaokr_glenie15_edges, radius=ZAOKR_GLENIE15_R)

    # Zaokrąglenie16
    zaokr_glenie16_edges = [part.edges().sort_by_distance(p)[0] for p in [
        (0.635, 2.15, 0),
    ]]
    fillet(zaokr_glenie16_edges, radius=ZAOKR_GLENIE16_R)

    # Zaokrąglenie17
    zaokr_glenie17_edges = [part.edges().sort_by_distance(p)[0] for p in [
        (1.905, 2.15, 0),
    ]]
    fillet(zaokr_glenie17_edges, radius=ZAOKR_GLENIE17_R)

    # Zaokrąglenie18
    zaokr_glenie18_edges = [part.edges().sort_by_distance(p)[0] for p in [
        (-1.905, -2.35, 0.2),
    ]]
    fillet(zaokr_glenie18_edges, radius=ZAOKR_GLENIE18_R)

    # Zaokrąglenie19
    zaokr_glenie19_edges = [part.edges().sort_by_distance(p)[0] for p in [
        (-0.635, -2.35, 0.2),
    ]]
    fillet(zaokr_glenie19_edges, radius=ZAOKR_GLENIE19_R)

    # Zaokrąglenie20
    zaokr_glenie20_edges = [part.edges().sort_by_distance(p)[0] for p in [
        (0.635, -2.35, 0.2),
    ]]
    fillet(zaokr_glenie20_edges, radius=ZAOKR_GLENIE20_R)

    # Zaokrąglenie21
    zaokr_glenie21_edges = [part.edges().sort_by_distance(p)[0] for p in [
        (1.905, -2.35, 0.2),
    ]]
    fillet(zaokr_glenie21_edges, radius=ZAOKR_GLENIE21_R)

    # Zaokrąglenie22
    zaokr_glenie22_edges = [part.edges().sort_by_distance(p)[0] for p in [
        (-0.635, -2.15, 0.95),
    ]]
    fillet(zaokr_glenie22_edges, radius=ZAOKR_GLENIE22_R)

    # Zaokrąglenie23
    zaokr_glenie23_edges = [part.edges().sort_by_distance(p)[0] for p in [
        (0.635, -2.15, 0.95),
    ]]
    fillet(zaokr_glenie23_edges, radius=ZAOKR_GLENIE23_R)

    # Zaokrąglenie24
    zaokr_glenie24_edges = [part.edges().sort_by_distance(p)[0] for p in [
        (1.905, -2.15, 0.95),
    ]]
    fillet(zaokr_glenie24_edges, radius=ZAOKR_GLENIE24_R)

    # Zaokrąglenie25
    zaokr_glenie25_edges = [part.edges().sort_by_distance(p)[0] for p in [
        (-1.905, 2.15, 0.95),
    ]]
    fillet(zaokr_glenie25_edges, radius=ZAOKR_GLENIE25_R)

    # Zaokrąglenie26
    zaokr_glenie26_edges = [part.edges().sort_by_distance(p)[0] for p in [
        (-0.635, 2.15, 0.95),
    ]]
    fillet(zaokr_glenie26_edges, radius=ZAOKR_GLENIE26_R)

    # Zaokrąglenie27
    zaokr_glenie27_edges = [part.edges().sort_by_distance(p)[0] for p in [
        (0.635, 2.15, 0.95),
    ]]
    fillet(zaokr_glenie27_edges, radius=ZAOKR_GLENIE27_R)

    # Zaokrąglenie28
    zaokr_glenie28_edges = [part.edges().sort_by_distance(p)[0] for p in [
        (1.905, 2.15, 0.95),
    ]]
    fillet(zaokr_glenie28_edges, radius=ZAOKR_GLENIE28_R)

    # Zaokrąglenie29
    zaokr_glenie29_edges = [part.edges().sort_by_distance(p)[0] for p in [
        (1.905, 2.35, 0.2),
    ]]
    fillet(zaokr_glenie29_edges, radius=ZAOKR_GLENIE29_R)

    # Zaokrąglenie30
    zaokr_glenie30_edges = [part.edges().sort_by_distance(p)[0] for p in [
        (0.635, 2.35, 0.2),
    ]]
    fillet(zaokr_glenie30_edges, radius=ZAOKR_GLENIE30_R)

    # Zaokrąglenie31
    zaokr_glenie31_edges = [part.edges().sort_by_distance(p)[0] for p in [
        (-0.635, 2.35, 0.2),
    ]]
    fillet(zaokr_glenie31_edges, radius=ZAOKR_GLENIE31_R)

    # Zaokrąglenie32
    zaokr_glenie32_edges = [part.edges().sort_by_distance(p)[0] for p in [
        (-1.905, 2.35, 0.2),
    ]]
    fillet(zaokr_glenie32_edges, radius=ZAOKR_GLENIE32_R)

    # Szkic15 → Wytnij-wyciągnięcie4 (cut)
    with BuildSketch(Plane.XY.offset(1.75)):
        with Locations((-1.7, -1.2)):
            Circle(SZKIC15_R)
    extrude(amount=-WYTNIJ_WYCI_GNI_CIE4_DEPTH, mode=Mode.SUBTRACT)

    # Zaokrąglenie33
    zaokr_glenie33_edges = [part.edges().sort_by_distance(p)[0] for p in [
        (-1.95, -1.2, 1.55),
    ]]
    fillet(zaokr_glenie33_edges, radius=ZAOKR_GLENIE33_R)


solid = part.part
